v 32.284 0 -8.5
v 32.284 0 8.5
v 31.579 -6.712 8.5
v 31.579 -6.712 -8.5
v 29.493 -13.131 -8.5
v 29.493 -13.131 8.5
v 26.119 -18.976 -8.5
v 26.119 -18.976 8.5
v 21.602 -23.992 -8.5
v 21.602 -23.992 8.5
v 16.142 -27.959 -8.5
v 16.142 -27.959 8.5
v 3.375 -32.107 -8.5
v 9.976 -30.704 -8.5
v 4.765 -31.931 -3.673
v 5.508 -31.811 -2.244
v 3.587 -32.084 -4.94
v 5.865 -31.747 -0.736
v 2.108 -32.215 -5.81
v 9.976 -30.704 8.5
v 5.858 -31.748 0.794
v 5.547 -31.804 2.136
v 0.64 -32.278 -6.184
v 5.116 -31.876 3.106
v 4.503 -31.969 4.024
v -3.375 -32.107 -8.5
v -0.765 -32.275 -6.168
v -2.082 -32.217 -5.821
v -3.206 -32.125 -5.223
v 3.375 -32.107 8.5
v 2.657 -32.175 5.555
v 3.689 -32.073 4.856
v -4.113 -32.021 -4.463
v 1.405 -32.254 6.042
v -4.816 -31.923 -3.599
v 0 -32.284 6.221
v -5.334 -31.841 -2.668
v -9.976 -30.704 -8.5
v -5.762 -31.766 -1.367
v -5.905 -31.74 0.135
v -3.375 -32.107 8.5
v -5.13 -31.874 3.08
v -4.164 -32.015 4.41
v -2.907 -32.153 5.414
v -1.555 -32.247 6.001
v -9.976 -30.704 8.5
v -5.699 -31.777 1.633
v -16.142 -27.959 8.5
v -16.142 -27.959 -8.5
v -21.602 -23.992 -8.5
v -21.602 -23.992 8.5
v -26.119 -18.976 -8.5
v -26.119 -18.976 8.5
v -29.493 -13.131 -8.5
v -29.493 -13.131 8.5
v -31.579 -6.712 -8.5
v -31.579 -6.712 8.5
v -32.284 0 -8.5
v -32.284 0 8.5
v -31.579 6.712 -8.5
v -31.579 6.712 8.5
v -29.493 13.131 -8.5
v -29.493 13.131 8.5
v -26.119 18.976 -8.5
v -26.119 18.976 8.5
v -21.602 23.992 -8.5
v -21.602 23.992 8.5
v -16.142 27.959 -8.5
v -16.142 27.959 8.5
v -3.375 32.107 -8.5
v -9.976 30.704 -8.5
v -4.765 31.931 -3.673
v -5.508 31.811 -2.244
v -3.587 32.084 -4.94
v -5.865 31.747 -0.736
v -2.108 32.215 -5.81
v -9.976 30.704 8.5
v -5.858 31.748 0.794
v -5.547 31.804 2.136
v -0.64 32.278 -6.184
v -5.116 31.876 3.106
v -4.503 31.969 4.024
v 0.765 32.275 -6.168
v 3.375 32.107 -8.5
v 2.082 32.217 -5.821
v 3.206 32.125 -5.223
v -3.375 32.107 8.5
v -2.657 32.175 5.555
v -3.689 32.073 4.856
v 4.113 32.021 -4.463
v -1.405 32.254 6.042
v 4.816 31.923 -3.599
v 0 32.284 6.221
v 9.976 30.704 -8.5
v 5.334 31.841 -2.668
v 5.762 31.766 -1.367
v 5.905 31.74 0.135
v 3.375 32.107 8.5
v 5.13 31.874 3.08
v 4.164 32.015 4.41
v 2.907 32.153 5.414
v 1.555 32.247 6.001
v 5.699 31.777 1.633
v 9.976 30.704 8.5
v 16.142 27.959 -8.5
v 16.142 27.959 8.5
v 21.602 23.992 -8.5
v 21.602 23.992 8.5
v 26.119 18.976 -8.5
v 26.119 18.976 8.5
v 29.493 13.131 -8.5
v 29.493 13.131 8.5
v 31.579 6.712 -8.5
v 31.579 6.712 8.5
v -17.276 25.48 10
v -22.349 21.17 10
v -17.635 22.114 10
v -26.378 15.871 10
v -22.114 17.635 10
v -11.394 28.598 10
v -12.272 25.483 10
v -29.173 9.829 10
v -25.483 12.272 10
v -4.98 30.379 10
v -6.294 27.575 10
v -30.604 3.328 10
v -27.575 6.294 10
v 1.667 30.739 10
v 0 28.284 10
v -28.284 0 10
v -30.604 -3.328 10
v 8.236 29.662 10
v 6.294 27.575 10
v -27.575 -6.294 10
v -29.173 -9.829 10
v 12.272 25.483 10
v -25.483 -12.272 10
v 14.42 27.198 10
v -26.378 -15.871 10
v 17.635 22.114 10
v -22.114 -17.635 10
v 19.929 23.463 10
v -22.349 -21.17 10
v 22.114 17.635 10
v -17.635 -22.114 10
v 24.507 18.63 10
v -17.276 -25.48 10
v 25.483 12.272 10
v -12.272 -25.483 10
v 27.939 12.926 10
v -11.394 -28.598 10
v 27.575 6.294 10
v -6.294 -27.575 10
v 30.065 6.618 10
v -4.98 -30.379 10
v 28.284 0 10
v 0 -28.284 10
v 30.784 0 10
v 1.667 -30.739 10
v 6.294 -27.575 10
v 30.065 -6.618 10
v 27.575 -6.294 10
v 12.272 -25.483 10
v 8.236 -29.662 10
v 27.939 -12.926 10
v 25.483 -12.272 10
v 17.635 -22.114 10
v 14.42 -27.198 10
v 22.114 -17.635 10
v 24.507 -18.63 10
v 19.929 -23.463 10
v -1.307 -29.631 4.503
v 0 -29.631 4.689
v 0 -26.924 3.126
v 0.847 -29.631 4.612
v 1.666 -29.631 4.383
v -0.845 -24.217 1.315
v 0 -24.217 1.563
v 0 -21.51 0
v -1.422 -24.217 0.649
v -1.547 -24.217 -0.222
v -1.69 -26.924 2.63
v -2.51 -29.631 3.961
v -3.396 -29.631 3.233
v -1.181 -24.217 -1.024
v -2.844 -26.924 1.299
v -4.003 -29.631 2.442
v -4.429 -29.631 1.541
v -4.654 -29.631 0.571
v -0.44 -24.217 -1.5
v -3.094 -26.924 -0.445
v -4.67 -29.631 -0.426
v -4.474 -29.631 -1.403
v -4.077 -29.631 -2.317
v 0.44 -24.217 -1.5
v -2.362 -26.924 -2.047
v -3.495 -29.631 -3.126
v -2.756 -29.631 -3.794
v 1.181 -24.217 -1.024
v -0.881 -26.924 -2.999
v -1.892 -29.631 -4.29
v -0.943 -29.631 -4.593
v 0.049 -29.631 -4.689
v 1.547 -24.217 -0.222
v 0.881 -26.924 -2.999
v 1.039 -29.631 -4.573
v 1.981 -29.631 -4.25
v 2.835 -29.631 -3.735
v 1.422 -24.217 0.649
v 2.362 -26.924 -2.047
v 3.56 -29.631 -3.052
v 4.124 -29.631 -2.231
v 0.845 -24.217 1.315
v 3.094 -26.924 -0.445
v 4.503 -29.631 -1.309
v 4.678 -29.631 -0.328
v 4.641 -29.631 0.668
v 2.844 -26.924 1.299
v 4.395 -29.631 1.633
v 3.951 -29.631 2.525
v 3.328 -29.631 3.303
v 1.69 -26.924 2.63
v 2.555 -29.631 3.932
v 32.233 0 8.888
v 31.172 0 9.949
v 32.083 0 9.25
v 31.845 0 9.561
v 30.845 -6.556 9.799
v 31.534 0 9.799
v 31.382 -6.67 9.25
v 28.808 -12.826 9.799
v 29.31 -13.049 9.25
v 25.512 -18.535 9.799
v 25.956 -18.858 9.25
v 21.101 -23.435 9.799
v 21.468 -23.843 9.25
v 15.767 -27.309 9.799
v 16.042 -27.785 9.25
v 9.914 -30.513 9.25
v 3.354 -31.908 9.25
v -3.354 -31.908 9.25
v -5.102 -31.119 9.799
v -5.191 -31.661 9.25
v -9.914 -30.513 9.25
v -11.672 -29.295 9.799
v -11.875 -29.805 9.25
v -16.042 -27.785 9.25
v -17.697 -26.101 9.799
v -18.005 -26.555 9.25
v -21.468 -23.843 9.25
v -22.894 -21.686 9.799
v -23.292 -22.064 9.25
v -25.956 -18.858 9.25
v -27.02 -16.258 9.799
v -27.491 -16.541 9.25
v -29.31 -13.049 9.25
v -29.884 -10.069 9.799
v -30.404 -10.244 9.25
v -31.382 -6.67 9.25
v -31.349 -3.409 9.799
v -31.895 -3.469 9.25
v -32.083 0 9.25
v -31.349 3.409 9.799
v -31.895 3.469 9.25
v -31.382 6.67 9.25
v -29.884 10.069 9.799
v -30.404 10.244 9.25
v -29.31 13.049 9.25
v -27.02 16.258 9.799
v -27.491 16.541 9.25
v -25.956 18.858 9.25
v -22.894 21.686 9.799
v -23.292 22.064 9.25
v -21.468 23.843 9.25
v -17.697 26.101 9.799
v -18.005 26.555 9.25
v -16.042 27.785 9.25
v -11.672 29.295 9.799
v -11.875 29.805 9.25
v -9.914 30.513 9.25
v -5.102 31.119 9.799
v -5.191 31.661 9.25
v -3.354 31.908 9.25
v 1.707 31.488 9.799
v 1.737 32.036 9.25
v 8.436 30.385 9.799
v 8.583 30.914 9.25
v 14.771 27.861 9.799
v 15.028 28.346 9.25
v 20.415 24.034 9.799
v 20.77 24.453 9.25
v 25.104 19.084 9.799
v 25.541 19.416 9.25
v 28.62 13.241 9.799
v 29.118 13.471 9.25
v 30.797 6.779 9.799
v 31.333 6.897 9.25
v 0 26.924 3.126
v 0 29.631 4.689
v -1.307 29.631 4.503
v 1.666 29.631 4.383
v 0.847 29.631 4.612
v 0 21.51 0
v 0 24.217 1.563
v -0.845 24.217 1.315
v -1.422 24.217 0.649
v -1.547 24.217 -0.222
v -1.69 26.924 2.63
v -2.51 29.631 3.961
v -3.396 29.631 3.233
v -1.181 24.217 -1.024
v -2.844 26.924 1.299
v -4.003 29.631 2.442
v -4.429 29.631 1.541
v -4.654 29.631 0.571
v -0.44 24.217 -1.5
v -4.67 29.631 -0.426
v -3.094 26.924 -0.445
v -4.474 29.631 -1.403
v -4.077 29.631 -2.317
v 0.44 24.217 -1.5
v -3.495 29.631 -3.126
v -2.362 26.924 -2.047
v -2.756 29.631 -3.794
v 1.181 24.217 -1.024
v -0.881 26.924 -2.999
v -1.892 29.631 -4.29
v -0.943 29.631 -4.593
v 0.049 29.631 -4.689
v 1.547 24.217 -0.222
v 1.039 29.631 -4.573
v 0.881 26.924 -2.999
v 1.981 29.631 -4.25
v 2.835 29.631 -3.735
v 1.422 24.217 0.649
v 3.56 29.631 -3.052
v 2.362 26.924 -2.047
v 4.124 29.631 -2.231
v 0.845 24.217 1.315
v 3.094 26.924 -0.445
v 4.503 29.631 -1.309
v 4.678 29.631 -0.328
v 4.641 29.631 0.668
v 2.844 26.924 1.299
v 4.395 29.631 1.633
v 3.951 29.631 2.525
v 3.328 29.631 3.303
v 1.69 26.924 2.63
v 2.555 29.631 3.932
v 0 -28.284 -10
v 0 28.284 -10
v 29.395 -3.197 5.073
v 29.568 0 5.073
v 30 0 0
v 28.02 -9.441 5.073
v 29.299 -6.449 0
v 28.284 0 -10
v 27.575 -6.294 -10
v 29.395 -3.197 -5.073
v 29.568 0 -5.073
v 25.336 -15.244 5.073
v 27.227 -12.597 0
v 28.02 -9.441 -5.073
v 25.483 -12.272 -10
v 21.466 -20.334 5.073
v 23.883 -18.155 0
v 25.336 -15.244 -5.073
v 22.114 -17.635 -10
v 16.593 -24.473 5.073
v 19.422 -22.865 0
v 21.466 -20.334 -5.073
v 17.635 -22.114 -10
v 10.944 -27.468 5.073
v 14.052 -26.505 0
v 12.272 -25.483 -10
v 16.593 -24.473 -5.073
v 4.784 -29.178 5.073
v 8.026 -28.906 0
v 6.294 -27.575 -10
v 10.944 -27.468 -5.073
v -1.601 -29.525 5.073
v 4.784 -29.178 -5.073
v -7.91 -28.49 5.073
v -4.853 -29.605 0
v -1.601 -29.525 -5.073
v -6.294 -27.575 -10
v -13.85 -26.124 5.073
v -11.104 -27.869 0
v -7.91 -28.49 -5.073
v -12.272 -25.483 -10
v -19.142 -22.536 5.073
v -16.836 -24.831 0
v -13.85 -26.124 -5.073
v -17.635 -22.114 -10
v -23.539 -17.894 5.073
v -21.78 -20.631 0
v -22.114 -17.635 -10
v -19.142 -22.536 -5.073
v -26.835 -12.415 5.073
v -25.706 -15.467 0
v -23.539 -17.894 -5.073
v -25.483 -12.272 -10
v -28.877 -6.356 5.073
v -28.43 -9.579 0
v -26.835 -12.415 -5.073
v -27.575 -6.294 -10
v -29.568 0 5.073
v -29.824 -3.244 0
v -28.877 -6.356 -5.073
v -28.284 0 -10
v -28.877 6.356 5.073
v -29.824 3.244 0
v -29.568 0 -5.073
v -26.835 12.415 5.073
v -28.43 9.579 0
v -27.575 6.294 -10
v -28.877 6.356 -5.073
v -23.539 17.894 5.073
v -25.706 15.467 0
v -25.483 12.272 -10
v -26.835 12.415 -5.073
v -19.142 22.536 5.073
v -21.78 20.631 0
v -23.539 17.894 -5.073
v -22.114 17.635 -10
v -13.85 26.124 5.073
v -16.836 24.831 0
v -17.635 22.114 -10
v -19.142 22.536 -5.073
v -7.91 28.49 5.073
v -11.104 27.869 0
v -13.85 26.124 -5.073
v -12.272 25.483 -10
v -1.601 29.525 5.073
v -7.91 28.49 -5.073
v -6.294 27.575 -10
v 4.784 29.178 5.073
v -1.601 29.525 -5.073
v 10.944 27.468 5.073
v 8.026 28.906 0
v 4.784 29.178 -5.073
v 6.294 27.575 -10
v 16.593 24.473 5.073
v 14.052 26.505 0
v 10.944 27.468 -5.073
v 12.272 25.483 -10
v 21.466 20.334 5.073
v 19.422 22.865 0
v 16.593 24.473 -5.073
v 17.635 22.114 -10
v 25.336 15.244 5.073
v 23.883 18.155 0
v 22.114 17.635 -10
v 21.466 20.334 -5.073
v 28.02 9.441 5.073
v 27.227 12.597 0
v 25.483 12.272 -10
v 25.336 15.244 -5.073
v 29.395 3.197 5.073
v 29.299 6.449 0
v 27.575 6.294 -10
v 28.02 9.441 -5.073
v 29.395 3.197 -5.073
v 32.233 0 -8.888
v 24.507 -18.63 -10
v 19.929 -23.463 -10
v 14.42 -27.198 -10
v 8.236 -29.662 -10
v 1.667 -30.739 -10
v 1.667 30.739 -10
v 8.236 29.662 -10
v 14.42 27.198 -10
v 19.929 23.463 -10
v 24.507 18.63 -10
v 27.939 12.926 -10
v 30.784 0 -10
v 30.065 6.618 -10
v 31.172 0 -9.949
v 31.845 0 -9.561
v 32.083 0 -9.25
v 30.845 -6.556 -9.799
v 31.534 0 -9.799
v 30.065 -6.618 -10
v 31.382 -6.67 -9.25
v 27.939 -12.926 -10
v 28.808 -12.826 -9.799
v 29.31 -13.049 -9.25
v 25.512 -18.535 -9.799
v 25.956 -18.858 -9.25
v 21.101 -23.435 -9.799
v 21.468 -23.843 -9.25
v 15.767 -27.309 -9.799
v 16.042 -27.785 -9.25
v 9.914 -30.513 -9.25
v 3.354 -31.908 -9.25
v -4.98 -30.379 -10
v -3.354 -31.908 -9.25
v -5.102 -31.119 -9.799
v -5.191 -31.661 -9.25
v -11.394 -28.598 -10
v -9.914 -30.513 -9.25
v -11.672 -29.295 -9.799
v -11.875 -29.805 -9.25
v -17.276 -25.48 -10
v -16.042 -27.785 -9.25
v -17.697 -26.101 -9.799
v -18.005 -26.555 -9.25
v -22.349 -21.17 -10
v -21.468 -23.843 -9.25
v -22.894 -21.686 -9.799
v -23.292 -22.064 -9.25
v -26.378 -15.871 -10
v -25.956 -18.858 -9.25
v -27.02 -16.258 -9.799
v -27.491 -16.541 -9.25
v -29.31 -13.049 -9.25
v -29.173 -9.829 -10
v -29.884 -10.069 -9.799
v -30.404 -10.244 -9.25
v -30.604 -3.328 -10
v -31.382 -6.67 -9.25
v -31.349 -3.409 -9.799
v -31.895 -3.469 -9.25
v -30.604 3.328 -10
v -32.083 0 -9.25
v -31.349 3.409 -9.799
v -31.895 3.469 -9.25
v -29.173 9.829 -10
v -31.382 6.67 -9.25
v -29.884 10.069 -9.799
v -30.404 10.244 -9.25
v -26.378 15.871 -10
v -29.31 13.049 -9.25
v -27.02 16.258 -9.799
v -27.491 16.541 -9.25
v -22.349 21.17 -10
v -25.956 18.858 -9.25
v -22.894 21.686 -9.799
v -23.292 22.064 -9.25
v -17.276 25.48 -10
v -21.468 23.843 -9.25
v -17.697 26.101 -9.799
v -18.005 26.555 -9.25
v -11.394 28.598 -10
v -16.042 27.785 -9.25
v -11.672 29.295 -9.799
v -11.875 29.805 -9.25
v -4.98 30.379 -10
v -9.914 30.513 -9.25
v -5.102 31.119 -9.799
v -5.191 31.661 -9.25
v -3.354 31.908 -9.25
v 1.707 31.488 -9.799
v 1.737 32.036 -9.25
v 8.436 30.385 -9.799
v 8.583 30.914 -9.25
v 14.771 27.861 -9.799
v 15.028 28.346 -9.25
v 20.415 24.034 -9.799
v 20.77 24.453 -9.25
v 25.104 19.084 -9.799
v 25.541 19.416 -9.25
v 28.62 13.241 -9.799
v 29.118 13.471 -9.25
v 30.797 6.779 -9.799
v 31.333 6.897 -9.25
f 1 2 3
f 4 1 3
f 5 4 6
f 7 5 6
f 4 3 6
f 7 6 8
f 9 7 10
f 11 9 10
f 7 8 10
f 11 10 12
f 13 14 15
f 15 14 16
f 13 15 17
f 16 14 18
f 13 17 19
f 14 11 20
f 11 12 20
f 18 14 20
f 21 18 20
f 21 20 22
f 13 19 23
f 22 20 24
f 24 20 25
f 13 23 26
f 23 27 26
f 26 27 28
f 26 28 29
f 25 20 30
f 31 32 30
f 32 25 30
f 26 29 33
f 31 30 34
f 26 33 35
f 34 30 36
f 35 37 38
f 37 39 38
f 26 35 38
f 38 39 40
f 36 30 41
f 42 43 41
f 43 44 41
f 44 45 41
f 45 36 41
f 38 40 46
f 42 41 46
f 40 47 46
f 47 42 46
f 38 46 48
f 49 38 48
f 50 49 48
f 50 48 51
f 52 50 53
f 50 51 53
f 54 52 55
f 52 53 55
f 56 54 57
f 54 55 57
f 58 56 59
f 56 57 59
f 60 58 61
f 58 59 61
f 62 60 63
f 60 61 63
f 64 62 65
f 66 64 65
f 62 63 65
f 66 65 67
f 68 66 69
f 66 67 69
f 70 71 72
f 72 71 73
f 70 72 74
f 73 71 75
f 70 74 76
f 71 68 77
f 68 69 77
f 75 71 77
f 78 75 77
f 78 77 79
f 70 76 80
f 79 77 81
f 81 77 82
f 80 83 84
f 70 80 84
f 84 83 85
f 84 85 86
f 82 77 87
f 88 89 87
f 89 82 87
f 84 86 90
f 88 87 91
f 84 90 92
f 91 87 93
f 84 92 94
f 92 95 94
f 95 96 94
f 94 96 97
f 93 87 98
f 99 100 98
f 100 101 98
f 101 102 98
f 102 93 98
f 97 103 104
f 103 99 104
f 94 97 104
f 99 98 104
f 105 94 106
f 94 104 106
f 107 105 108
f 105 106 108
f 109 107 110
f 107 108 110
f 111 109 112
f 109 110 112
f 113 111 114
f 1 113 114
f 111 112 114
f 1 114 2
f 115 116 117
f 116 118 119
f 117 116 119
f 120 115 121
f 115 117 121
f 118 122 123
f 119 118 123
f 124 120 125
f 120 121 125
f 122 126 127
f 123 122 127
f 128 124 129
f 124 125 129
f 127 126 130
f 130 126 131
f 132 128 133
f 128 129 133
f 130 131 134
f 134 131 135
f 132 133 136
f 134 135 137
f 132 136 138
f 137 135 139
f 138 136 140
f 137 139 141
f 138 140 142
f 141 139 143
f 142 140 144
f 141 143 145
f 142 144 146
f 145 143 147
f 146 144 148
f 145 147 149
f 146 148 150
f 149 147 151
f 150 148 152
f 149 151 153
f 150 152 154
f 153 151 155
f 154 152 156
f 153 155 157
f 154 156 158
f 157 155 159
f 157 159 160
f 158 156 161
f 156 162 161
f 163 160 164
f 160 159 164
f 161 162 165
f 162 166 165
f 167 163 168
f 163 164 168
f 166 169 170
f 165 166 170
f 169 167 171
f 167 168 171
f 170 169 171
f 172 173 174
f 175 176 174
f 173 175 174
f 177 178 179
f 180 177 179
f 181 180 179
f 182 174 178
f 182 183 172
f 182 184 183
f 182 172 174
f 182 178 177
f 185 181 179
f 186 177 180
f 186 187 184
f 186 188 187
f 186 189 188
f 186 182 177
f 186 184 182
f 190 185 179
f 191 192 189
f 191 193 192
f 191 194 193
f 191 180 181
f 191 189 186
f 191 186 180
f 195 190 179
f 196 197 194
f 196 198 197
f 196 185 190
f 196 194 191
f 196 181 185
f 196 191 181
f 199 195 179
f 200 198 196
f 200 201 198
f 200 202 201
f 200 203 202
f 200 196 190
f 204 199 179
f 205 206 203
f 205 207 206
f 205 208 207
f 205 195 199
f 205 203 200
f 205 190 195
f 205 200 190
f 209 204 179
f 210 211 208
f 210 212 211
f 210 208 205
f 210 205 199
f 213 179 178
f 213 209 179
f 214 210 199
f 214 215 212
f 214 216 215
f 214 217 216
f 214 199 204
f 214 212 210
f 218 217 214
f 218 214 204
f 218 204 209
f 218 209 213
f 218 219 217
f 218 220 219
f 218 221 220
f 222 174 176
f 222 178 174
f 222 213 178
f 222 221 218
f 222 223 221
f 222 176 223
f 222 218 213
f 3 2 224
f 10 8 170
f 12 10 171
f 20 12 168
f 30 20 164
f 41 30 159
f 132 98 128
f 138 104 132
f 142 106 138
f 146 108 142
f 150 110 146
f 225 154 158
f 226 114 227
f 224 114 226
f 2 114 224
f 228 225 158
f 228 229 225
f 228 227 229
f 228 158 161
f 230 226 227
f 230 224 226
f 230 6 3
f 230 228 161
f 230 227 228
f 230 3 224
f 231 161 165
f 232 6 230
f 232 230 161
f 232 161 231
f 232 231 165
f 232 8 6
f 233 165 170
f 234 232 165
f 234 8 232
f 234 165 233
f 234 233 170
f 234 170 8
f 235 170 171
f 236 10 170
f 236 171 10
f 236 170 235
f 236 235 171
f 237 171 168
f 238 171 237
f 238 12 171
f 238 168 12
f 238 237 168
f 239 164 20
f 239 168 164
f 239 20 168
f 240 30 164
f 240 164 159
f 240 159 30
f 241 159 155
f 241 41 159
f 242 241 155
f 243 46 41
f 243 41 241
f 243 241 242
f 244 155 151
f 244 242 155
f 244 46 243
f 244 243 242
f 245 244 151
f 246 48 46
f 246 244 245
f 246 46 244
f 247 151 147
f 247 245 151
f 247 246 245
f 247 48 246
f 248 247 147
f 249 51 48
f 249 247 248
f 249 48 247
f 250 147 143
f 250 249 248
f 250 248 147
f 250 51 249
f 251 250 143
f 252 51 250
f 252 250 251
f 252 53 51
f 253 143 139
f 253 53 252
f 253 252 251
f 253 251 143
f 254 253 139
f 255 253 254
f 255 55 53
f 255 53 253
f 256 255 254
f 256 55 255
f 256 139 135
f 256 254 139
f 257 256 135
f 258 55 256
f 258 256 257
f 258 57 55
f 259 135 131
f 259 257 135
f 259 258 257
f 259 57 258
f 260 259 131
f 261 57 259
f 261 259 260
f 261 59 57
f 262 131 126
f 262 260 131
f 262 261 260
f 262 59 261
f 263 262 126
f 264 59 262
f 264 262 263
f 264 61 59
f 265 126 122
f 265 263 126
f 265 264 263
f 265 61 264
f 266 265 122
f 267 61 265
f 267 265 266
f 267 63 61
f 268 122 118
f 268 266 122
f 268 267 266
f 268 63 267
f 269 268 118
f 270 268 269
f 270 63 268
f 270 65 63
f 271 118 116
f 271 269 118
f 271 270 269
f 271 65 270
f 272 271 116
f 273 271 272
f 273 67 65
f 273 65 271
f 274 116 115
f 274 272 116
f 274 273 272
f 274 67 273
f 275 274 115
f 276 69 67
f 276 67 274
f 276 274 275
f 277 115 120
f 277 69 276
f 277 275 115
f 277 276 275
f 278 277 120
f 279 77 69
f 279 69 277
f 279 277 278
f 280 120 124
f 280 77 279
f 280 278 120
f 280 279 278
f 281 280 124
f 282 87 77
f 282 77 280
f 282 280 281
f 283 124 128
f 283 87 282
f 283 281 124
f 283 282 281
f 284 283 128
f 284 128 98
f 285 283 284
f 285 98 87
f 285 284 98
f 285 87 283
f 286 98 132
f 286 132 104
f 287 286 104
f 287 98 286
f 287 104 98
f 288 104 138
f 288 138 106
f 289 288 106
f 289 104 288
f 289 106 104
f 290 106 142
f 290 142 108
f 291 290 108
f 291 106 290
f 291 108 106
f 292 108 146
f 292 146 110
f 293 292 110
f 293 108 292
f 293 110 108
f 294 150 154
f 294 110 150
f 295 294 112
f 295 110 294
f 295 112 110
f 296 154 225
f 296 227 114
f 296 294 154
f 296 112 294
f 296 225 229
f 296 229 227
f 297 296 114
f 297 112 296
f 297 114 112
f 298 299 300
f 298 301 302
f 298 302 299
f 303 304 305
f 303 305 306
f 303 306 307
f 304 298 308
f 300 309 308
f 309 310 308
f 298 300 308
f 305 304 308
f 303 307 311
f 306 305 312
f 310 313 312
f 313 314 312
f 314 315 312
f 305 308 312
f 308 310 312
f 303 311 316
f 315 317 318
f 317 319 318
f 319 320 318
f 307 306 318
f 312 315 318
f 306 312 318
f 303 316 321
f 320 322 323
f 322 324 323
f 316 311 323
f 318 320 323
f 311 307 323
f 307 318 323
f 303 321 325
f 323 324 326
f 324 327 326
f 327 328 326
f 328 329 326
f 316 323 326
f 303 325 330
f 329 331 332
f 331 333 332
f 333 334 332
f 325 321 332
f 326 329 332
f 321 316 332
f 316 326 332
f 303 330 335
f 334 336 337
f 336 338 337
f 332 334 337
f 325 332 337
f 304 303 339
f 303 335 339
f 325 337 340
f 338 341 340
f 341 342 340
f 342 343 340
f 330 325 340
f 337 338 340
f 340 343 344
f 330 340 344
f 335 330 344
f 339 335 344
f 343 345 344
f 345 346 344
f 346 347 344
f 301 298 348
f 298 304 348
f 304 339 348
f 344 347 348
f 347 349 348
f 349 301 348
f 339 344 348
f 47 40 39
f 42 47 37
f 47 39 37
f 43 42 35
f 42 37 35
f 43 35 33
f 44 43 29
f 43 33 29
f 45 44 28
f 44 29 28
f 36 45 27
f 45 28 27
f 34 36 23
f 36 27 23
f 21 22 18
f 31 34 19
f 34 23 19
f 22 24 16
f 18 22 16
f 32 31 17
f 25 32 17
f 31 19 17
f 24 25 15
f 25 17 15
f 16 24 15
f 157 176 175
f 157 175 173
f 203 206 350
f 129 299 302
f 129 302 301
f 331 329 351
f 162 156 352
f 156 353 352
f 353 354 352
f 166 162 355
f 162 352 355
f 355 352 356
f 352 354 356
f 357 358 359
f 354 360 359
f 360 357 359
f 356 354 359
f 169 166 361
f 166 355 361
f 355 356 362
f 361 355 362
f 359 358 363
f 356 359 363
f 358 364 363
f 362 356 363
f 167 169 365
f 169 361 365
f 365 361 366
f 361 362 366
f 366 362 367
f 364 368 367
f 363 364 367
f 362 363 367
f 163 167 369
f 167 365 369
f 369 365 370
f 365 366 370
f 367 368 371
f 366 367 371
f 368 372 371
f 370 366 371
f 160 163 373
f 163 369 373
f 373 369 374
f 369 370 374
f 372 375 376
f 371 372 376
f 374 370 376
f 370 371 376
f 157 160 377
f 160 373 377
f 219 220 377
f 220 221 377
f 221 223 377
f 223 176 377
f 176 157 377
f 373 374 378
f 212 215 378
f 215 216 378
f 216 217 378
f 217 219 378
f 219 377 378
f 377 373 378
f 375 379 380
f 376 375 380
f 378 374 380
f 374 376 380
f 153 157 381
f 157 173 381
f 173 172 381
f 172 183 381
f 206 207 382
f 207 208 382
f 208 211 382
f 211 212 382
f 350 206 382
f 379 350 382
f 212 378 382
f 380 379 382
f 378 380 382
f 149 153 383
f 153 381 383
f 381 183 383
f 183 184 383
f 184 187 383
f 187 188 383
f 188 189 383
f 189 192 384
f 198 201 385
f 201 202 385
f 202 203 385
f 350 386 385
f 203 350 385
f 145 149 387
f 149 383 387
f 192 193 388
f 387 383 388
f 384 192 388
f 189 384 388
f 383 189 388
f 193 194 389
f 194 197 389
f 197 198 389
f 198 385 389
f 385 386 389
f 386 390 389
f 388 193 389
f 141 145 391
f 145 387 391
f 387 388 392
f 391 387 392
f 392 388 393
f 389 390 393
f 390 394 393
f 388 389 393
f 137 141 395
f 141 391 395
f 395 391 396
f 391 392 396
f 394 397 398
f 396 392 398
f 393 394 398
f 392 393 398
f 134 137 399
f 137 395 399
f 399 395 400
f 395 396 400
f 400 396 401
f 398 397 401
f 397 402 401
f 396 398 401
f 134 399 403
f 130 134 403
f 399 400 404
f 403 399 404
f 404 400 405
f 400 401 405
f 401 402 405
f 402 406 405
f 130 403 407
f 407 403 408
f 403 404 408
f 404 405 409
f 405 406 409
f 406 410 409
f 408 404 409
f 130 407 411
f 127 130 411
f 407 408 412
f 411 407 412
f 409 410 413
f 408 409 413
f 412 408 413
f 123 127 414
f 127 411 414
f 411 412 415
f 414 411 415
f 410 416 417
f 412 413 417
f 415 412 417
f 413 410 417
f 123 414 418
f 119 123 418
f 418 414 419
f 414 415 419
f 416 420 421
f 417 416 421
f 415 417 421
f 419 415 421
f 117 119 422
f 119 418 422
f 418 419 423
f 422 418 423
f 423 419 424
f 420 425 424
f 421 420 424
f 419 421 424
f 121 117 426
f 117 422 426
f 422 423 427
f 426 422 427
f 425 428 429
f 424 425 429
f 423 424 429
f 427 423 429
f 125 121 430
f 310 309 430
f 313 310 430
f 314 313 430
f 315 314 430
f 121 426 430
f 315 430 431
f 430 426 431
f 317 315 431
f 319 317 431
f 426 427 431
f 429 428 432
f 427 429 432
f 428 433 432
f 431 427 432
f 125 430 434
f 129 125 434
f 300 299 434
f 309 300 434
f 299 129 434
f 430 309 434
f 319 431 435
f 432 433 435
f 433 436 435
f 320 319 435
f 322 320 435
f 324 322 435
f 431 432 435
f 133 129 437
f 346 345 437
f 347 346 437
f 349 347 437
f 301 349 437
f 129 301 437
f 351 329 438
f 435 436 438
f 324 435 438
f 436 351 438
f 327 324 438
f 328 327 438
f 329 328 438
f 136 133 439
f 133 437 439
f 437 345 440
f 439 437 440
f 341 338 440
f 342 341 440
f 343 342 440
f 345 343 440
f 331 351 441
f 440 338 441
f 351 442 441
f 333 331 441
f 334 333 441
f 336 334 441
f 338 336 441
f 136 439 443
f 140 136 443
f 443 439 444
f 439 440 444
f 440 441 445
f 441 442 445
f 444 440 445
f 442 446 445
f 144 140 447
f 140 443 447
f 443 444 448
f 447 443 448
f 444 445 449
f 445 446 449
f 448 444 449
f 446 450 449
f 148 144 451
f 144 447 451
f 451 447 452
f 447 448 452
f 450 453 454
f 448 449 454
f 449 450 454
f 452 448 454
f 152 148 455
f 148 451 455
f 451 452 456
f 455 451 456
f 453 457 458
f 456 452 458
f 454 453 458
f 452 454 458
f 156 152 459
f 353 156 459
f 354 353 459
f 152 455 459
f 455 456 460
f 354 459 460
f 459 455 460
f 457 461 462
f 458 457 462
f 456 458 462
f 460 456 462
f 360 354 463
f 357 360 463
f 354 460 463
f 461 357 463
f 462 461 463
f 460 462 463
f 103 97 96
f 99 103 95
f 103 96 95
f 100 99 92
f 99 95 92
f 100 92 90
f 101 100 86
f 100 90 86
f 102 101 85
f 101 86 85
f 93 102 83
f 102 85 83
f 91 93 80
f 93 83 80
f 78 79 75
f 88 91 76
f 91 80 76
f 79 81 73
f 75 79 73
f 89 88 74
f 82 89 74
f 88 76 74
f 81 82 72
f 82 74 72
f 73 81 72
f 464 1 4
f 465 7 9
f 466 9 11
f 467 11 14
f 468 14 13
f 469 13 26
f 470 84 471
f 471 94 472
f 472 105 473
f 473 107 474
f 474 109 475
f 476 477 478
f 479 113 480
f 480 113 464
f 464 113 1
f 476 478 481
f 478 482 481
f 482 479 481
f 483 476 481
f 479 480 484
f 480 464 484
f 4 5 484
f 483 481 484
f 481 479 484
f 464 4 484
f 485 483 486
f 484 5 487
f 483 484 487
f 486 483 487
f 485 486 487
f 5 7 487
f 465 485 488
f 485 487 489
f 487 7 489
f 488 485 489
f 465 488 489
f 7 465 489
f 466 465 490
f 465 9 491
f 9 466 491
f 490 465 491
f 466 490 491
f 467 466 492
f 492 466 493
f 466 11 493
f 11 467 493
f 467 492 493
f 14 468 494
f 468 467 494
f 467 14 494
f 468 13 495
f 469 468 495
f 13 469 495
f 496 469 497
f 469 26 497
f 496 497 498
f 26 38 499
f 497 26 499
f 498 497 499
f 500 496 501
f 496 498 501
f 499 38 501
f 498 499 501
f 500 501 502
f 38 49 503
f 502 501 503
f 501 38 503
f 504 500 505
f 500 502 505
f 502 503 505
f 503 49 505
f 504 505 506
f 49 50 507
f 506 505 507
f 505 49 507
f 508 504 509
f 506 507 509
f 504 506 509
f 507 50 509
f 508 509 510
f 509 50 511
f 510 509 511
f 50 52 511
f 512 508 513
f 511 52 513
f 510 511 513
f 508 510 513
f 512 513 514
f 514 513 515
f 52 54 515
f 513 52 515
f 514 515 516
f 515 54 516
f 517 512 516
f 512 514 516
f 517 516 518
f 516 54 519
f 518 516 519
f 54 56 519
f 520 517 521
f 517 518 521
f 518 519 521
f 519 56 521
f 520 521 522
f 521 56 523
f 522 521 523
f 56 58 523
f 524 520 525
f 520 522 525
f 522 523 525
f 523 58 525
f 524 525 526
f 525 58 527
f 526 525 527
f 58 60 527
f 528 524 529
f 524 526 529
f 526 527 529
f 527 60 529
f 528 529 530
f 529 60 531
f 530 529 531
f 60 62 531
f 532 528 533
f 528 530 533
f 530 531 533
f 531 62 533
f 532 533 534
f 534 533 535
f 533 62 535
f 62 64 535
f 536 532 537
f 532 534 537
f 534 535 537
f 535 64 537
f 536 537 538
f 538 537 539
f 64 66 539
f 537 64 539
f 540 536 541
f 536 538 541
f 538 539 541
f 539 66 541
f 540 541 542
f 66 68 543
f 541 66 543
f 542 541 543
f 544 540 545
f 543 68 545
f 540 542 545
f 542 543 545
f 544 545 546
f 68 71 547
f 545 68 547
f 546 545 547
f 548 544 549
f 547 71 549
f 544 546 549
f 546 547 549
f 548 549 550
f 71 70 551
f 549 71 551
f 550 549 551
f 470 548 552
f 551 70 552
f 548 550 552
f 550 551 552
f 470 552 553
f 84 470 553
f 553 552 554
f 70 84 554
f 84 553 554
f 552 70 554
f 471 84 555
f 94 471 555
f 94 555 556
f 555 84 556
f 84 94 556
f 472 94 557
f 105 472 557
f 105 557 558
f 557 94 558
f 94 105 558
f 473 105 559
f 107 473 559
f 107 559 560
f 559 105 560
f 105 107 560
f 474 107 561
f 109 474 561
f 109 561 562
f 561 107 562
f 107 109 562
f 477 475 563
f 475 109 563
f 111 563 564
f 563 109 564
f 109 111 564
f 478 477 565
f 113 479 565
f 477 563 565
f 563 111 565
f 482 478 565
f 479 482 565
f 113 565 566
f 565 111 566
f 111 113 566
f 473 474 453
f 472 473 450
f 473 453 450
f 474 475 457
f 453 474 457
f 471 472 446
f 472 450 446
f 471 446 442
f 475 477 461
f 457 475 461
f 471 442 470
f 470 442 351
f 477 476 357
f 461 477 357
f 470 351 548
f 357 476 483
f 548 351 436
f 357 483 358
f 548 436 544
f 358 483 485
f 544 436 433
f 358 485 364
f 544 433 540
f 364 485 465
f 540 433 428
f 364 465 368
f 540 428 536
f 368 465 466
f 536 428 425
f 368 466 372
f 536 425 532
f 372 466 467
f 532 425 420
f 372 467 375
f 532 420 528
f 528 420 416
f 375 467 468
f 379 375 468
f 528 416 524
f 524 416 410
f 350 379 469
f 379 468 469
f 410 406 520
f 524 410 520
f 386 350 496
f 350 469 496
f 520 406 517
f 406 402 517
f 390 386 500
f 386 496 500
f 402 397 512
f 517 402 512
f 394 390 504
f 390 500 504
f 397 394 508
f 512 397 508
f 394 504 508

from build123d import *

# Parameters (mm, degrees)
F4_R     = 37.2842712475
F4_R_2   = 32.2842712475
F5_DEPTH = 12.5
F6_R     = 1.5


# Not quite as in the source:
# - a pattern or mirror of a feature is missing from the dataset's text; its kind, count and spacing are read off the source's solid


with BuildPart() as f1:
    # F0 (on Front) → F1 (revolve)
    with BuildSketch(Plane.XZ):
        with BuildLine():
            Line((32.2842712475, 10), (28.2842712475, 10))
            ThreePointArc((28.2842712475, 10), (30, 0), (28.2842712475, -10))
            Line((28.2842712475, -10), (32.2842712475, -10))
            Line((32.2842712475, -10), (32.2842712475, 10))
        make_face()
    revolve(axis=Axis((0, 0, -0.0082536135), (0, 0, -1)))

    # F2 (on Right) → F3 (revolve)
    with BuildSketch(Plane.YZ):
        Polygon((-21.5096189432, 0), (-34.5, 7.5), (-34.5, 0), align=None)
    f3 = revolve(axis=Axis((0, -28.0048094716, 0), (0, -1, 0)))

    # F3_copies: F3 across plane
    add(f3.mirror(Plane.ZX))

    # F4 (on Top) → F5 (cut, symmetric)
    with BuildSketch(Plane.XY):
        Circle(F4_R)
        Circle(F4_R_2, mode=Mode.SUBTRACT)
    extrude(amount=F5_DEPTH, both=True, mode=Mode.SUBTRACT)

    # F6
    f6_edges = [f1.edges().sort_by_distance(p)[0] for p in [
        (-32.284271, 0, 10),
        (-32.284271, 0, -10),
    ]]
    fillet(f6_edges, radius=F6_R)


solid = f1.part
